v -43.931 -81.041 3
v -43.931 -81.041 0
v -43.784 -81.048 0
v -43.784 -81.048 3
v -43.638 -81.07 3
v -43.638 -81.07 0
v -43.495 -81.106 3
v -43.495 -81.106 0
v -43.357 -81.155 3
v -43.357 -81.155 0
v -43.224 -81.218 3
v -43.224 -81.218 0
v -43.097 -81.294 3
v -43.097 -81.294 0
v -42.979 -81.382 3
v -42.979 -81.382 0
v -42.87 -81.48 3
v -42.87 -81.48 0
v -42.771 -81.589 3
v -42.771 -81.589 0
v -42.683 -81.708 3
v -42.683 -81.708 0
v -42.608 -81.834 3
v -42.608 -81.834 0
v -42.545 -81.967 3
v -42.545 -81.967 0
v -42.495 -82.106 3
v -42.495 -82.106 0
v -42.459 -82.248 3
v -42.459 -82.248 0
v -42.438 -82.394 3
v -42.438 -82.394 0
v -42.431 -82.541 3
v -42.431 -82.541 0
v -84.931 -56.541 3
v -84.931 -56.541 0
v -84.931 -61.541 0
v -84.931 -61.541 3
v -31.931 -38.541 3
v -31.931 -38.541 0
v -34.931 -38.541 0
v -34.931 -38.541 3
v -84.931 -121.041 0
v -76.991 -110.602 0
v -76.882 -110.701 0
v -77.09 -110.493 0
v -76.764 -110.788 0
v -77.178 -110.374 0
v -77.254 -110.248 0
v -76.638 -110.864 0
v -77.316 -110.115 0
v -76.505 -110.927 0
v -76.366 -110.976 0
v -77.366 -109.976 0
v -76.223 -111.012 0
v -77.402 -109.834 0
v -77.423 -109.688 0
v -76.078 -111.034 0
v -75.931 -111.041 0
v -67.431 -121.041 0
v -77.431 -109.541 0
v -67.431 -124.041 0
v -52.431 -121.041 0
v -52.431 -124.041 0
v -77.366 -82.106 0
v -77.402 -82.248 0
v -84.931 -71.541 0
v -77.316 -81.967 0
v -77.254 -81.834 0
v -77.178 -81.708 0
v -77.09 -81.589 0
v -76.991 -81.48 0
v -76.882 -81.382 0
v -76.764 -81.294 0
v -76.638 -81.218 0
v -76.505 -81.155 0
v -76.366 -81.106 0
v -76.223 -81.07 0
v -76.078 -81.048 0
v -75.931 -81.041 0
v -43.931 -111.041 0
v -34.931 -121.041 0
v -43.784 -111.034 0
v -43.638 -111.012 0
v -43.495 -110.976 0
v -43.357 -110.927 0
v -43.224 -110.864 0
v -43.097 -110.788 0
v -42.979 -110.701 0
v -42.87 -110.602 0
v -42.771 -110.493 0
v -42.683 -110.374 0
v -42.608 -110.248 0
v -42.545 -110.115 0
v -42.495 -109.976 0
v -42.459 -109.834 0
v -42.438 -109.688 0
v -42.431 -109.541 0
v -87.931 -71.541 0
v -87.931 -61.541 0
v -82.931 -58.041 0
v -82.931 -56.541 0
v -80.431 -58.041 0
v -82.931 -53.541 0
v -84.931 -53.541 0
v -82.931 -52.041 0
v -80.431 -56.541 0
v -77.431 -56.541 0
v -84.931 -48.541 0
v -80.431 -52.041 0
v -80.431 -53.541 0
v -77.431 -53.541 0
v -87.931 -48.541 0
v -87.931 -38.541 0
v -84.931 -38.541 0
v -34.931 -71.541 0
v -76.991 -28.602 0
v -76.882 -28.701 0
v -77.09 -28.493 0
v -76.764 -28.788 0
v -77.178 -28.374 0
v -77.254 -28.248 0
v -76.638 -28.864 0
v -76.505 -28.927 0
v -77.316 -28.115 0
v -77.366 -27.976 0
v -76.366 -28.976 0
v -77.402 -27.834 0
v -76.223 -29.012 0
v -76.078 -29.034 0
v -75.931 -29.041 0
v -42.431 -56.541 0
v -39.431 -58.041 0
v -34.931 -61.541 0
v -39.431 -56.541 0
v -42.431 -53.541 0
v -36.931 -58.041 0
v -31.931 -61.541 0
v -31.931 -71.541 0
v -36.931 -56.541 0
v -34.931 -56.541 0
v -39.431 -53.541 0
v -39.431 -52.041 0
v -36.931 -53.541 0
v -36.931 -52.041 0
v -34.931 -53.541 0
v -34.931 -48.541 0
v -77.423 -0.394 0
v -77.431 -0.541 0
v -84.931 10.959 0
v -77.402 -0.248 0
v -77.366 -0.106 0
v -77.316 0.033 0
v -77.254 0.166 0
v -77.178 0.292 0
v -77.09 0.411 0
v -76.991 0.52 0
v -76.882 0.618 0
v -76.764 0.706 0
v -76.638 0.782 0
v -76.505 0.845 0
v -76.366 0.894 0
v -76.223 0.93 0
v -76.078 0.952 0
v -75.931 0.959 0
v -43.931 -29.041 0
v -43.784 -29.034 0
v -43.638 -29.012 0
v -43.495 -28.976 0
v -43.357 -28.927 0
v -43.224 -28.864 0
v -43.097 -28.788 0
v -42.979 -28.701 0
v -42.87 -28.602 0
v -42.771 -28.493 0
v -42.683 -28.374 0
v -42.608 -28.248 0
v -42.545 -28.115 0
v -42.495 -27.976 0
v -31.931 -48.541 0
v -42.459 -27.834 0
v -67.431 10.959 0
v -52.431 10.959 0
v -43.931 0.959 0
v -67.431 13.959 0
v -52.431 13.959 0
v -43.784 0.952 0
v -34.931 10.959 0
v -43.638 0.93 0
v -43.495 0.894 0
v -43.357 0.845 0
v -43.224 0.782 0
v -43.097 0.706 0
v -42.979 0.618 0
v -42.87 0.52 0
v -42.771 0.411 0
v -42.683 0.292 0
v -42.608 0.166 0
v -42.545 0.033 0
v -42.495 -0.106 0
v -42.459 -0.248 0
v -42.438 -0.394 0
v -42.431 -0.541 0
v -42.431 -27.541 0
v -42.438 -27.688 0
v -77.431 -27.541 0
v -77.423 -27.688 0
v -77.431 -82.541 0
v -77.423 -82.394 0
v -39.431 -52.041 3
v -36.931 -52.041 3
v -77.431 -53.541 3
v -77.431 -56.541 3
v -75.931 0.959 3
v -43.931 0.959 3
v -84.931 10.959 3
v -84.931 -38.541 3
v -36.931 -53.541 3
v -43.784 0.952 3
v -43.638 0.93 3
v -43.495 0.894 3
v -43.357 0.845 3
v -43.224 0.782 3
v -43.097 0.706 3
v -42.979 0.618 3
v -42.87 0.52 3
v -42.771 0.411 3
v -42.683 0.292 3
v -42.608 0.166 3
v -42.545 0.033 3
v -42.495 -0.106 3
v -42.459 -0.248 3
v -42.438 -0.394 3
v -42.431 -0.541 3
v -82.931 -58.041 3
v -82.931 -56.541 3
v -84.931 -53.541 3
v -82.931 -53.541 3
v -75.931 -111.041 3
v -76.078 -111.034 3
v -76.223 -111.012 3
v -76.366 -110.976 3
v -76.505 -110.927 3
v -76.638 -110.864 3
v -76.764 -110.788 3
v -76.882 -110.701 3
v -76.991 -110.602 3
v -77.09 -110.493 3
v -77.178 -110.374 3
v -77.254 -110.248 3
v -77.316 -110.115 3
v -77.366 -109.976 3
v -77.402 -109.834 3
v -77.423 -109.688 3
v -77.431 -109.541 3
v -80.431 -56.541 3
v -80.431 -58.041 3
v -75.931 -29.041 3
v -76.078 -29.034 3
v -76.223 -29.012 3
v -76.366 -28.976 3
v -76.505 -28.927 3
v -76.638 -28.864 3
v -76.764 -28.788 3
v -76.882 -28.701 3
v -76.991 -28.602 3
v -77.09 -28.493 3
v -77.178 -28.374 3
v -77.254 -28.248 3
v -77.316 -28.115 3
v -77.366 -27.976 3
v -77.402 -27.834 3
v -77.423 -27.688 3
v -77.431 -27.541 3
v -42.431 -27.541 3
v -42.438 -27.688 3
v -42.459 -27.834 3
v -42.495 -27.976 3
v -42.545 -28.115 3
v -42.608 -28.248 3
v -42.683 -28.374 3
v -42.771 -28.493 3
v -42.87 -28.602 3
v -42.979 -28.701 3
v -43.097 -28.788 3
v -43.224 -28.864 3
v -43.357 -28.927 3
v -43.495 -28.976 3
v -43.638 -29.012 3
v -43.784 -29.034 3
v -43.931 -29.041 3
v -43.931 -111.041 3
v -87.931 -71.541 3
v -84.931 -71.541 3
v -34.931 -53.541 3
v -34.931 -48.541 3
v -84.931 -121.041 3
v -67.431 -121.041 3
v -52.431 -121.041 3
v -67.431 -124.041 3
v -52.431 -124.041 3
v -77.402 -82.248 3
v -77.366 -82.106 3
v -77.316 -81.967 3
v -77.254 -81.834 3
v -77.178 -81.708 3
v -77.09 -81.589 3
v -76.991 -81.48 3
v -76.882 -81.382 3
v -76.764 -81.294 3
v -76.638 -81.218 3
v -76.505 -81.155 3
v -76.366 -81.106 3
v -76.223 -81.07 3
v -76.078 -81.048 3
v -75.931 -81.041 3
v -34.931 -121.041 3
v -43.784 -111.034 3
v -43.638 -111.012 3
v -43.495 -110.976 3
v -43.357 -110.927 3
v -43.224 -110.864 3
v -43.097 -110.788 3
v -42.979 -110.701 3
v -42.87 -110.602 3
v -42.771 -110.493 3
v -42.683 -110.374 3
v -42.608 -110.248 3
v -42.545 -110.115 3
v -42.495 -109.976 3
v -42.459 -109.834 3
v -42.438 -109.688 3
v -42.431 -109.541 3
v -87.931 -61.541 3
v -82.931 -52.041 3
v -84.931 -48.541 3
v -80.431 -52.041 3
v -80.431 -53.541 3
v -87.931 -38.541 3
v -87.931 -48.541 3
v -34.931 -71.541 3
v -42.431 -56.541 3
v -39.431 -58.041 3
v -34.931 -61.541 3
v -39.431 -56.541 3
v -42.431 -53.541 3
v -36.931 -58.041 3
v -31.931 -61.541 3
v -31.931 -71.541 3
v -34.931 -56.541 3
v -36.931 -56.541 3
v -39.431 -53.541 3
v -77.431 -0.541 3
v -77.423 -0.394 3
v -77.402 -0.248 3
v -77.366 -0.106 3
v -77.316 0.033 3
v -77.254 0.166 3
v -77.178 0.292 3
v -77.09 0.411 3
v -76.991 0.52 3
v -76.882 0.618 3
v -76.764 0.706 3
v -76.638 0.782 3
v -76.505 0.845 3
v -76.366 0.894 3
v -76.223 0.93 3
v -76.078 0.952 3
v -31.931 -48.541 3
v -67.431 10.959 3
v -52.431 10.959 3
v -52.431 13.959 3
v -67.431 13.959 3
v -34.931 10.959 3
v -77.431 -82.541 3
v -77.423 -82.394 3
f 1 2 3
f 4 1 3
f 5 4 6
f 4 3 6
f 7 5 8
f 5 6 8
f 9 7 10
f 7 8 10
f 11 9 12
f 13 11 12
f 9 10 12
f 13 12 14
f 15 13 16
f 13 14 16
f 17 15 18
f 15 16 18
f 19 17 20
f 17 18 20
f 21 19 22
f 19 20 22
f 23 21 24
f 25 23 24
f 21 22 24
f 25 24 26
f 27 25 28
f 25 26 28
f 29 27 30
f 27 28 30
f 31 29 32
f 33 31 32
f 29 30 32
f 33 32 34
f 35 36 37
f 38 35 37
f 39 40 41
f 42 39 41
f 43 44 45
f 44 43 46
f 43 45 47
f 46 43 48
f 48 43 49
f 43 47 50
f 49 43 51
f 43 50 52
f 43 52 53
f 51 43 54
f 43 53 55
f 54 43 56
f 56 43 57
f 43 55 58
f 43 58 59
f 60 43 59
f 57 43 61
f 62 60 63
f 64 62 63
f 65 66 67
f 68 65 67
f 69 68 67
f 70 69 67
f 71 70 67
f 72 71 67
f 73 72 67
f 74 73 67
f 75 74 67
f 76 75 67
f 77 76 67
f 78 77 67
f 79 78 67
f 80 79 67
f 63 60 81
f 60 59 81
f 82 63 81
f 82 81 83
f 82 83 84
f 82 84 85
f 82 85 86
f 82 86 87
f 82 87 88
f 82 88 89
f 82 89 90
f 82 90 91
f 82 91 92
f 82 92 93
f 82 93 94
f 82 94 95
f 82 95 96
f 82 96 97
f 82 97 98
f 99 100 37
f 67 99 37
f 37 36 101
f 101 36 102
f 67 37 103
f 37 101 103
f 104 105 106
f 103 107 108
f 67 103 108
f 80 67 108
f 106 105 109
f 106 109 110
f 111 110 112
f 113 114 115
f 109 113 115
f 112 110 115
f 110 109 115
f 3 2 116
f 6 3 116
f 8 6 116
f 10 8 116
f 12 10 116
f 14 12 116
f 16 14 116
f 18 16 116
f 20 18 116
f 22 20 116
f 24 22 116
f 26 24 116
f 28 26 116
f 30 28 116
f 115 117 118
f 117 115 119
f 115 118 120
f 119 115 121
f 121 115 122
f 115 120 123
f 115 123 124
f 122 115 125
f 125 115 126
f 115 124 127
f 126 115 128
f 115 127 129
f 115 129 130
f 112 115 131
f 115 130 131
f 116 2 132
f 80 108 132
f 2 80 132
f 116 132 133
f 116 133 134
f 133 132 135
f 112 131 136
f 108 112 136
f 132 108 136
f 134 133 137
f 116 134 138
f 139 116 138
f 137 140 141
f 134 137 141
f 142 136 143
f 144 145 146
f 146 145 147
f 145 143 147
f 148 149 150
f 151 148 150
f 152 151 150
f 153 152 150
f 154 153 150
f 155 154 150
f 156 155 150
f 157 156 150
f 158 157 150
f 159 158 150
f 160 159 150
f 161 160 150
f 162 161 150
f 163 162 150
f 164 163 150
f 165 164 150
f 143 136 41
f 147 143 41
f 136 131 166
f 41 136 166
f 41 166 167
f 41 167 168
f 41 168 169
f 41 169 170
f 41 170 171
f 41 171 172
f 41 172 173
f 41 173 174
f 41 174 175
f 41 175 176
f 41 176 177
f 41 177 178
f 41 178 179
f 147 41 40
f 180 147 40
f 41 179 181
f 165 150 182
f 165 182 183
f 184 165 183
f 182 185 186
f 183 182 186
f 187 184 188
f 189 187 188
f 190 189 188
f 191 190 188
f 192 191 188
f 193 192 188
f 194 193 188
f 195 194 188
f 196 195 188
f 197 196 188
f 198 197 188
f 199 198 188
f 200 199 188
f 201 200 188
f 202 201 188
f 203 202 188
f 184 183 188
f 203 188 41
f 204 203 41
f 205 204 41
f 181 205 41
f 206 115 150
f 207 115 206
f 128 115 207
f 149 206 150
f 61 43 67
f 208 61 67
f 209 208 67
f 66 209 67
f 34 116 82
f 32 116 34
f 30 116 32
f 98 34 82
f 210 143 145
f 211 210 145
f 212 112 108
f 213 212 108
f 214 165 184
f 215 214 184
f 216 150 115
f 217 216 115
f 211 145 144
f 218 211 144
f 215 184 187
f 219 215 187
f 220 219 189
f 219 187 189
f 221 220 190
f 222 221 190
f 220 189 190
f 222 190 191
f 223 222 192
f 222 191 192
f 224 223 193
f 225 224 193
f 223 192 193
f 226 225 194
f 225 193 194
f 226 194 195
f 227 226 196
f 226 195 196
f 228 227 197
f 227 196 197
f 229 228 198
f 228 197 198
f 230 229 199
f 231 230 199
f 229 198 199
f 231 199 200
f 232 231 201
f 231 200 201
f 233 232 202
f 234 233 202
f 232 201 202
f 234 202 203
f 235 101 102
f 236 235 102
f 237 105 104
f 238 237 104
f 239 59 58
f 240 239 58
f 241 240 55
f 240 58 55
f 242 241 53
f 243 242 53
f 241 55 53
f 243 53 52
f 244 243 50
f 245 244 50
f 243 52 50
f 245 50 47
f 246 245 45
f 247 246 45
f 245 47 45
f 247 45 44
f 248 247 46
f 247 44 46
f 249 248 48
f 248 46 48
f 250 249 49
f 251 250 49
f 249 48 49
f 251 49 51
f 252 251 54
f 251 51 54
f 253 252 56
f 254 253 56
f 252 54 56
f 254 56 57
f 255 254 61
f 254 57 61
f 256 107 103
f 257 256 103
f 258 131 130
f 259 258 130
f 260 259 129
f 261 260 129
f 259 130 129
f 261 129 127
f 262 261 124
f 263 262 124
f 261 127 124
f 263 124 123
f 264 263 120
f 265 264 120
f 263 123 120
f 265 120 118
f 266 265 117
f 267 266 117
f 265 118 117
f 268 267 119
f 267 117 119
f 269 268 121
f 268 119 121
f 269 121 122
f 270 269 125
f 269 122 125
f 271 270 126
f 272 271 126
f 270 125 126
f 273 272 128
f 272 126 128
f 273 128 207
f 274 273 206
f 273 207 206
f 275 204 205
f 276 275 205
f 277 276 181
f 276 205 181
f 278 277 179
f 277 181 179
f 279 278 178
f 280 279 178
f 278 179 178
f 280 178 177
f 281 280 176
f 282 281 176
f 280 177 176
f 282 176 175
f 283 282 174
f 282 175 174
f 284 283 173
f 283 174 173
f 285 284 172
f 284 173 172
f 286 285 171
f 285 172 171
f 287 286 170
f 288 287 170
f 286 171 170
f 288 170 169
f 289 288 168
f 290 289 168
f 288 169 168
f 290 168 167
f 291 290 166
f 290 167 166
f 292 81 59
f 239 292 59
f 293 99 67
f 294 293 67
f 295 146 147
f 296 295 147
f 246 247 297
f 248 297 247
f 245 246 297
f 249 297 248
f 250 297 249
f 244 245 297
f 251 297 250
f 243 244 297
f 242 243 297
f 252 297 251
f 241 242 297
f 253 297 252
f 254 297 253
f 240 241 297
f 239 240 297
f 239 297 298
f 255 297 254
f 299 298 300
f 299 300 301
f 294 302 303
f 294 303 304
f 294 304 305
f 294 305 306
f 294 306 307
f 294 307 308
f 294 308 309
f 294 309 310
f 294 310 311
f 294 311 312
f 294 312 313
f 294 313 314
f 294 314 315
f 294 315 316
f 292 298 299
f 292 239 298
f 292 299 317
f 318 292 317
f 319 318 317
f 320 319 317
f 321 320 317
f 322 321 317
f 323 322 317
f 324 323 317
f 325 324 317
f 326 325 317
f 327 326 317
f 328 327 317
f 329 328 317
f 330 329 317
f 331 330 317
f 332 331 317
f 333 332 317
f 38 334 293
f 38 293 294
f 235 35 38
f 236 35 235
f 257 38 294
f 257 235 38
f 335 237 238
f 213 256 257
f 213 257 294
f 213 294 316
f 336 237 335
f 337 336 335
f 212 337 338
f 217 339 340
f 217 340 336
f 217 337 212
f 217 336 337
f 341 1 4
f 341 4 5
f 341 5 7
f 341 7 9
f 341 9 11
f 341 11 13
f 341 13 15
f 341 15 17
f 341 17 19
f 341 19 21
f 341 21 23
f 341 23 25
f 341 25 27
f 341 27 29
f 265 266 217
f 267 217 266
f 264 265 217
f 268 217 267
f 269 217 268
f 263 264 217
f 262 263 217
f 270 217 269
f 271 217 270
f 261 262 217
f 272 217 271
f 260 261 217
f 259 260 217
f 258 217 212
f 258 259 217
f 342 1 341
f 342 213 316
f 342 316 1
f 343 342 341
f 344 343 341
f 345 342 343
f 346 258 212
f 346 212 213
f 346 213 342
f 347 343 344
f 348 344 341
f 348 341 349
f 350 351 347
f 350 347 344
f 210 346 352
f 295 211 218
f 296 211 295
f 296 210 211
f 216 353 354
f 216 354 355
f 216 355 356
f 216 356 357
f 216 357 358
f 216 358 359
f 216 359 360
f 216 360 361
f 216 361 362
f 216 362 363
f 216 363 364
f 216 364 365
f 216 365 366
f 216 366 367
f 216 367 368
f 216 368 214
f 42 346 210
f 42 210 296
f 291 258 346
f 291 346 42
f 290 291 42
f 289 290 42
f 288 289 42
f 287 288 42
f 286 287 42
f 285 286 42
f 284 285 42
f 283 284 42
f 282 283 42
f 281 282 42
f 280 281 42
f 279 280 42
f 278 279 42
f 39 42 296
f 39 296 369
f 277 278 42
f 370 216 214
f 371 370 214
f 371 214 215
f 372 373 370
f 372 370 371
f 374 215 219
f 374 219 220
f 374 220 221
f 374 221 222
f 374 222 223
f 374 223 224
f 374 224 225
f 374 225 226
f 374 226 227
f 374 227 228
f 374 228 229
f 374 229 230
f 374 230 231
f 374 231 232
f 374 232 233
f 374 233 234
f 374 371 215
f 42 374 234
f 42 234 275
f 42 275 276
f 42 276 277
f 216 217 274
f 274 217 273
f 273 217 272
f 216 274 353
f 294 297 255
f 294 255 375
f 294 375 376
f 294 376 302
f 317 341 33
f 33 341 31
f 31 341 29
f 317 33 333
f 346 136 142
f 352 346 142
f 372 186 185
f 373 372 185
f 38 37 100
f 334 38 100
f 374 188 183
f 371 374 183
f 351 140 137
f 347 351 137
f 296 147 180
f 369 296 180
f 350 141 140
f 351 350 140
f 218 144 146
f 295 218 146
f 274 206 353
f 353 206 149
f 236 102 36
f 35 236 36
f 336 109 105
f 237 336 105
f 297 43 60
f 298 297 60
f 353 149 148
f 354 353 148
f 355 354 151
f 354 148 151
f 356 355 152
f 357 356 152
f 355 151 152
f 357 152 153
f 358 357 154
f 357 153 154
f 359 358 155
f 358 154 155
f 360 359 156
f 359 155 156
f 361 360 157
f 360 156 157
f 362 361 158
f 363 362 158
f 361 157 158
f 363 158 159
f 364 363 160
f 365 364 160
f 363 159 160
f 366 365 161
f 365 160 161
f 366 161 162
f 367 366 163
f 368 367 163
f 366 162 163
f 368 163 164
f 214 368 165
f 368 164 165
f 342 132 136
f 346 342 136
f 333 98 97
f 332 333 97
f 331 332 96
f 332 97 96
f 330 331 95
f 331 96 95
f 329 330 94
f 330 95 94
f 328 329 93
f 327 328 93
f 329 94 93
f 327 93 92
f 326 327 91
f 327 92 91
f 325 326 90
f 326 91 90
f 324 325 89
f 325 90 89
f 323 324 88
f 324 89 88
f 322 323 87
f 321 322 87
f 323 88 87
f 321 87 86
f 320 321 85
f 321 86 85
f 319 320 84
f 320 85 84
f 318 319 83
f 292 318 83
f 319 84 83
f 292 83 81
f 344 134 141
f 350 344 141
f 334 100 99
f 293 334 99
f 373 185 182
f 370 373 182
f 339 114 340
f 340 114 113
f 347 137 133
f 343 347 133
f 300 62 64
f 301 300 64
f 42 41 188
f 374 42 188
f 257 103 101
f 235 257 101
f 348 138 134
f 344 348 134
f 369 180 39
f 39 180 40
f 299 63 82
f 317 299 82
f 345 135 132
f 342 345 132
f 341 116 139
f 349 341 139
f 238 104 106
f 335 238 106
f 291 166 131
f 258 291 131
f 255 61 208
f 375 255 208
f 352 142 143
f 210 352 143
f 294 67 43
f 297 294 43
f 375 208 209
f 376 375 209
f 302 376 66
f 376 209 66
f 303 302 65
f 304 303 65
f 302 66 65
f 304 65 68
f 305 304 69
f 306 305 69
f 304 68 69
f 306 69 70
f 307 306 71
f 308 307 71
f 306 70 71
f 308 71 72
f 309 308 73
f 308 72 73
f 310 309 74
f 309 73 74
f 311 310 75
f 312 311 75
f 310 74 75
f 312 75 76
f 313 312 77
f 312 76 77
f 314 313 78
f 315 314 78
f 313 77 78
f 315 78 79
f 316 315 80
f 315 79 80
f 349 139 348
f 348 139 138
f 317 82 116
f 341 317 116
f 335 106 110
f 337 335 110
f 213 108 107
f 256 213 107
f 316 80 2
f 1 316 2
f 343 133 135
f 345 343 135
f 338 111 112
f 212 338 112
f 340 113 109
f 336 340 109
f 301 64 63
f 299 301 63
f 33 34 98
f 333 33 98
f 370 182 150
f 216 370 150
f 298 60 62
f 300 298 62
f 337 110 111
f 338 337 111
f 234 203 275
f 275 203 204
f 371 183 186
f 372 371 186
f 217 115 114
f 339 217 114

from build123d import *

# Parameters (mm, degrees)
F1_DEPTH = 3


with BuildPart() as f1:
    # F0 (on Top) → F1 (new body)
    with BuildSketch(Plane.XY):
        Polygon((-34.93066, -38.541029), (-34.93066, 10.958971), (-52.43066, 10.958971), (-52.43066, 13.958971), (-67.43066, 13.958971), (-67.43066, 10.958971), (-84.93066, 10.958971), (-84.93066, -38.541029), (-87.93066, -38.541029), (-87.93066, -48.541029), (-84.93066, -48.541029), (-84.93066, -53.541029), (-82.93066, -53.541029), (-82.93066, -52.041029), (-80.43066, -52.041029), (-80.43066, -53.541029), (-77.43066, -53.541029), (-77.43066, -56.541029), (-80.43066, -56.541029), (-80.43066, -58.041029), (-82.93066, -58.041029), (-82.93066, -56.541029), (-84.93066, -56.541029), (-84.93066, -61.541029), (-87.93066, -61.541029), (-87.93066, -71.541029), (-84.93066, -71.541029), (-84.93066, -121.041029), (-67.43066, -121.041029), (-67.43066, -124.041029), (-52.43066, -124.041029), (-52.43066, -121.041029), (-34.93066, -121.041029), (-34.93066, -71.541029), (-31.93066, -71.541029), (-31.93066, -61.541029), (-34.93066, -61.541029), (-34.93066, -56.541029), (-36.93066, -56.541029), (-36.93066, -58.041029), (-39.43066, -58.041029), (-39.43066, -56.541029), (-42.43066, -56.541029), (-42.43066, -53.541029), (-39.43066, -53.541029), (-39.43066, -52.041029), (-36.93066, -52.041029), (-36.93066, -53.541029), (-34.93066, -53.541029), (-34.93066, -48.541029), (-31.93066, -48.541029), (-31.93066, -38.541029), align=None)
        with BuildLine():
            Line((-75.93066, -81.041029), (-43.93066, -81.041029))
            ThreePointArc((-43.93066, -81.041029), (-42.869999, -81.480369), (-42.43066, -82.541029))
            Line((-42.43066, -82.541029), (-42.43066, -109.541029))
            ThreePointArc((-42.43066, -109.541029), (-42.869999, -110.601689), (-43.93066, -111.041029))
            Line((-43.93066, -111.041029), (-75.93066, -111.041029))
            ThreePointArc((-75.93066, -111.041029), (-76.99132, -110.601689), (-77.43066, -109.541029))
            Line((-77.43066, -109.541029), (-77.43066, -82.541029))
            ThreePointArc((-77.43066, -82.541029), (-76.99132, -81.480369), (-75.93066, -81.041029))
        make_face(mode=Mode.SUBTRACT)
        with BuildLine():
            ThreePointArc((-77.43066, -0.541029), (-76.99132, 0.519631), (-75.93066, 0.958971))
            Line((-75.93066, 0.958971), (-43.93066, 0.958971))
            ThreePointArc((-43.93066, 0.958971), (-42.869999, 0.519631), (-42.43066, -0.541029))
            Line((-42.43066, -0.541029), (-42.43066, -27.541029))
            ThreePointArc((-42.43066, -27.541029), (-42.869999, -28.601689), (-43.93066, -29.041029))
            Line((-43.93066, -29.041029), (-75.93066, -29.041029))
            ThreePointArc((-75.93066, -29.041029), (-76.99132, -28.601689), (-77.43066, -27.541029))
            Line((-77.43066, -27.541029), (-77.43066, -0.541029))
        make_face(mode=Mode.SUBTRACT)
    extrude(amount=F1_DEPTH)


solid = f1.part
